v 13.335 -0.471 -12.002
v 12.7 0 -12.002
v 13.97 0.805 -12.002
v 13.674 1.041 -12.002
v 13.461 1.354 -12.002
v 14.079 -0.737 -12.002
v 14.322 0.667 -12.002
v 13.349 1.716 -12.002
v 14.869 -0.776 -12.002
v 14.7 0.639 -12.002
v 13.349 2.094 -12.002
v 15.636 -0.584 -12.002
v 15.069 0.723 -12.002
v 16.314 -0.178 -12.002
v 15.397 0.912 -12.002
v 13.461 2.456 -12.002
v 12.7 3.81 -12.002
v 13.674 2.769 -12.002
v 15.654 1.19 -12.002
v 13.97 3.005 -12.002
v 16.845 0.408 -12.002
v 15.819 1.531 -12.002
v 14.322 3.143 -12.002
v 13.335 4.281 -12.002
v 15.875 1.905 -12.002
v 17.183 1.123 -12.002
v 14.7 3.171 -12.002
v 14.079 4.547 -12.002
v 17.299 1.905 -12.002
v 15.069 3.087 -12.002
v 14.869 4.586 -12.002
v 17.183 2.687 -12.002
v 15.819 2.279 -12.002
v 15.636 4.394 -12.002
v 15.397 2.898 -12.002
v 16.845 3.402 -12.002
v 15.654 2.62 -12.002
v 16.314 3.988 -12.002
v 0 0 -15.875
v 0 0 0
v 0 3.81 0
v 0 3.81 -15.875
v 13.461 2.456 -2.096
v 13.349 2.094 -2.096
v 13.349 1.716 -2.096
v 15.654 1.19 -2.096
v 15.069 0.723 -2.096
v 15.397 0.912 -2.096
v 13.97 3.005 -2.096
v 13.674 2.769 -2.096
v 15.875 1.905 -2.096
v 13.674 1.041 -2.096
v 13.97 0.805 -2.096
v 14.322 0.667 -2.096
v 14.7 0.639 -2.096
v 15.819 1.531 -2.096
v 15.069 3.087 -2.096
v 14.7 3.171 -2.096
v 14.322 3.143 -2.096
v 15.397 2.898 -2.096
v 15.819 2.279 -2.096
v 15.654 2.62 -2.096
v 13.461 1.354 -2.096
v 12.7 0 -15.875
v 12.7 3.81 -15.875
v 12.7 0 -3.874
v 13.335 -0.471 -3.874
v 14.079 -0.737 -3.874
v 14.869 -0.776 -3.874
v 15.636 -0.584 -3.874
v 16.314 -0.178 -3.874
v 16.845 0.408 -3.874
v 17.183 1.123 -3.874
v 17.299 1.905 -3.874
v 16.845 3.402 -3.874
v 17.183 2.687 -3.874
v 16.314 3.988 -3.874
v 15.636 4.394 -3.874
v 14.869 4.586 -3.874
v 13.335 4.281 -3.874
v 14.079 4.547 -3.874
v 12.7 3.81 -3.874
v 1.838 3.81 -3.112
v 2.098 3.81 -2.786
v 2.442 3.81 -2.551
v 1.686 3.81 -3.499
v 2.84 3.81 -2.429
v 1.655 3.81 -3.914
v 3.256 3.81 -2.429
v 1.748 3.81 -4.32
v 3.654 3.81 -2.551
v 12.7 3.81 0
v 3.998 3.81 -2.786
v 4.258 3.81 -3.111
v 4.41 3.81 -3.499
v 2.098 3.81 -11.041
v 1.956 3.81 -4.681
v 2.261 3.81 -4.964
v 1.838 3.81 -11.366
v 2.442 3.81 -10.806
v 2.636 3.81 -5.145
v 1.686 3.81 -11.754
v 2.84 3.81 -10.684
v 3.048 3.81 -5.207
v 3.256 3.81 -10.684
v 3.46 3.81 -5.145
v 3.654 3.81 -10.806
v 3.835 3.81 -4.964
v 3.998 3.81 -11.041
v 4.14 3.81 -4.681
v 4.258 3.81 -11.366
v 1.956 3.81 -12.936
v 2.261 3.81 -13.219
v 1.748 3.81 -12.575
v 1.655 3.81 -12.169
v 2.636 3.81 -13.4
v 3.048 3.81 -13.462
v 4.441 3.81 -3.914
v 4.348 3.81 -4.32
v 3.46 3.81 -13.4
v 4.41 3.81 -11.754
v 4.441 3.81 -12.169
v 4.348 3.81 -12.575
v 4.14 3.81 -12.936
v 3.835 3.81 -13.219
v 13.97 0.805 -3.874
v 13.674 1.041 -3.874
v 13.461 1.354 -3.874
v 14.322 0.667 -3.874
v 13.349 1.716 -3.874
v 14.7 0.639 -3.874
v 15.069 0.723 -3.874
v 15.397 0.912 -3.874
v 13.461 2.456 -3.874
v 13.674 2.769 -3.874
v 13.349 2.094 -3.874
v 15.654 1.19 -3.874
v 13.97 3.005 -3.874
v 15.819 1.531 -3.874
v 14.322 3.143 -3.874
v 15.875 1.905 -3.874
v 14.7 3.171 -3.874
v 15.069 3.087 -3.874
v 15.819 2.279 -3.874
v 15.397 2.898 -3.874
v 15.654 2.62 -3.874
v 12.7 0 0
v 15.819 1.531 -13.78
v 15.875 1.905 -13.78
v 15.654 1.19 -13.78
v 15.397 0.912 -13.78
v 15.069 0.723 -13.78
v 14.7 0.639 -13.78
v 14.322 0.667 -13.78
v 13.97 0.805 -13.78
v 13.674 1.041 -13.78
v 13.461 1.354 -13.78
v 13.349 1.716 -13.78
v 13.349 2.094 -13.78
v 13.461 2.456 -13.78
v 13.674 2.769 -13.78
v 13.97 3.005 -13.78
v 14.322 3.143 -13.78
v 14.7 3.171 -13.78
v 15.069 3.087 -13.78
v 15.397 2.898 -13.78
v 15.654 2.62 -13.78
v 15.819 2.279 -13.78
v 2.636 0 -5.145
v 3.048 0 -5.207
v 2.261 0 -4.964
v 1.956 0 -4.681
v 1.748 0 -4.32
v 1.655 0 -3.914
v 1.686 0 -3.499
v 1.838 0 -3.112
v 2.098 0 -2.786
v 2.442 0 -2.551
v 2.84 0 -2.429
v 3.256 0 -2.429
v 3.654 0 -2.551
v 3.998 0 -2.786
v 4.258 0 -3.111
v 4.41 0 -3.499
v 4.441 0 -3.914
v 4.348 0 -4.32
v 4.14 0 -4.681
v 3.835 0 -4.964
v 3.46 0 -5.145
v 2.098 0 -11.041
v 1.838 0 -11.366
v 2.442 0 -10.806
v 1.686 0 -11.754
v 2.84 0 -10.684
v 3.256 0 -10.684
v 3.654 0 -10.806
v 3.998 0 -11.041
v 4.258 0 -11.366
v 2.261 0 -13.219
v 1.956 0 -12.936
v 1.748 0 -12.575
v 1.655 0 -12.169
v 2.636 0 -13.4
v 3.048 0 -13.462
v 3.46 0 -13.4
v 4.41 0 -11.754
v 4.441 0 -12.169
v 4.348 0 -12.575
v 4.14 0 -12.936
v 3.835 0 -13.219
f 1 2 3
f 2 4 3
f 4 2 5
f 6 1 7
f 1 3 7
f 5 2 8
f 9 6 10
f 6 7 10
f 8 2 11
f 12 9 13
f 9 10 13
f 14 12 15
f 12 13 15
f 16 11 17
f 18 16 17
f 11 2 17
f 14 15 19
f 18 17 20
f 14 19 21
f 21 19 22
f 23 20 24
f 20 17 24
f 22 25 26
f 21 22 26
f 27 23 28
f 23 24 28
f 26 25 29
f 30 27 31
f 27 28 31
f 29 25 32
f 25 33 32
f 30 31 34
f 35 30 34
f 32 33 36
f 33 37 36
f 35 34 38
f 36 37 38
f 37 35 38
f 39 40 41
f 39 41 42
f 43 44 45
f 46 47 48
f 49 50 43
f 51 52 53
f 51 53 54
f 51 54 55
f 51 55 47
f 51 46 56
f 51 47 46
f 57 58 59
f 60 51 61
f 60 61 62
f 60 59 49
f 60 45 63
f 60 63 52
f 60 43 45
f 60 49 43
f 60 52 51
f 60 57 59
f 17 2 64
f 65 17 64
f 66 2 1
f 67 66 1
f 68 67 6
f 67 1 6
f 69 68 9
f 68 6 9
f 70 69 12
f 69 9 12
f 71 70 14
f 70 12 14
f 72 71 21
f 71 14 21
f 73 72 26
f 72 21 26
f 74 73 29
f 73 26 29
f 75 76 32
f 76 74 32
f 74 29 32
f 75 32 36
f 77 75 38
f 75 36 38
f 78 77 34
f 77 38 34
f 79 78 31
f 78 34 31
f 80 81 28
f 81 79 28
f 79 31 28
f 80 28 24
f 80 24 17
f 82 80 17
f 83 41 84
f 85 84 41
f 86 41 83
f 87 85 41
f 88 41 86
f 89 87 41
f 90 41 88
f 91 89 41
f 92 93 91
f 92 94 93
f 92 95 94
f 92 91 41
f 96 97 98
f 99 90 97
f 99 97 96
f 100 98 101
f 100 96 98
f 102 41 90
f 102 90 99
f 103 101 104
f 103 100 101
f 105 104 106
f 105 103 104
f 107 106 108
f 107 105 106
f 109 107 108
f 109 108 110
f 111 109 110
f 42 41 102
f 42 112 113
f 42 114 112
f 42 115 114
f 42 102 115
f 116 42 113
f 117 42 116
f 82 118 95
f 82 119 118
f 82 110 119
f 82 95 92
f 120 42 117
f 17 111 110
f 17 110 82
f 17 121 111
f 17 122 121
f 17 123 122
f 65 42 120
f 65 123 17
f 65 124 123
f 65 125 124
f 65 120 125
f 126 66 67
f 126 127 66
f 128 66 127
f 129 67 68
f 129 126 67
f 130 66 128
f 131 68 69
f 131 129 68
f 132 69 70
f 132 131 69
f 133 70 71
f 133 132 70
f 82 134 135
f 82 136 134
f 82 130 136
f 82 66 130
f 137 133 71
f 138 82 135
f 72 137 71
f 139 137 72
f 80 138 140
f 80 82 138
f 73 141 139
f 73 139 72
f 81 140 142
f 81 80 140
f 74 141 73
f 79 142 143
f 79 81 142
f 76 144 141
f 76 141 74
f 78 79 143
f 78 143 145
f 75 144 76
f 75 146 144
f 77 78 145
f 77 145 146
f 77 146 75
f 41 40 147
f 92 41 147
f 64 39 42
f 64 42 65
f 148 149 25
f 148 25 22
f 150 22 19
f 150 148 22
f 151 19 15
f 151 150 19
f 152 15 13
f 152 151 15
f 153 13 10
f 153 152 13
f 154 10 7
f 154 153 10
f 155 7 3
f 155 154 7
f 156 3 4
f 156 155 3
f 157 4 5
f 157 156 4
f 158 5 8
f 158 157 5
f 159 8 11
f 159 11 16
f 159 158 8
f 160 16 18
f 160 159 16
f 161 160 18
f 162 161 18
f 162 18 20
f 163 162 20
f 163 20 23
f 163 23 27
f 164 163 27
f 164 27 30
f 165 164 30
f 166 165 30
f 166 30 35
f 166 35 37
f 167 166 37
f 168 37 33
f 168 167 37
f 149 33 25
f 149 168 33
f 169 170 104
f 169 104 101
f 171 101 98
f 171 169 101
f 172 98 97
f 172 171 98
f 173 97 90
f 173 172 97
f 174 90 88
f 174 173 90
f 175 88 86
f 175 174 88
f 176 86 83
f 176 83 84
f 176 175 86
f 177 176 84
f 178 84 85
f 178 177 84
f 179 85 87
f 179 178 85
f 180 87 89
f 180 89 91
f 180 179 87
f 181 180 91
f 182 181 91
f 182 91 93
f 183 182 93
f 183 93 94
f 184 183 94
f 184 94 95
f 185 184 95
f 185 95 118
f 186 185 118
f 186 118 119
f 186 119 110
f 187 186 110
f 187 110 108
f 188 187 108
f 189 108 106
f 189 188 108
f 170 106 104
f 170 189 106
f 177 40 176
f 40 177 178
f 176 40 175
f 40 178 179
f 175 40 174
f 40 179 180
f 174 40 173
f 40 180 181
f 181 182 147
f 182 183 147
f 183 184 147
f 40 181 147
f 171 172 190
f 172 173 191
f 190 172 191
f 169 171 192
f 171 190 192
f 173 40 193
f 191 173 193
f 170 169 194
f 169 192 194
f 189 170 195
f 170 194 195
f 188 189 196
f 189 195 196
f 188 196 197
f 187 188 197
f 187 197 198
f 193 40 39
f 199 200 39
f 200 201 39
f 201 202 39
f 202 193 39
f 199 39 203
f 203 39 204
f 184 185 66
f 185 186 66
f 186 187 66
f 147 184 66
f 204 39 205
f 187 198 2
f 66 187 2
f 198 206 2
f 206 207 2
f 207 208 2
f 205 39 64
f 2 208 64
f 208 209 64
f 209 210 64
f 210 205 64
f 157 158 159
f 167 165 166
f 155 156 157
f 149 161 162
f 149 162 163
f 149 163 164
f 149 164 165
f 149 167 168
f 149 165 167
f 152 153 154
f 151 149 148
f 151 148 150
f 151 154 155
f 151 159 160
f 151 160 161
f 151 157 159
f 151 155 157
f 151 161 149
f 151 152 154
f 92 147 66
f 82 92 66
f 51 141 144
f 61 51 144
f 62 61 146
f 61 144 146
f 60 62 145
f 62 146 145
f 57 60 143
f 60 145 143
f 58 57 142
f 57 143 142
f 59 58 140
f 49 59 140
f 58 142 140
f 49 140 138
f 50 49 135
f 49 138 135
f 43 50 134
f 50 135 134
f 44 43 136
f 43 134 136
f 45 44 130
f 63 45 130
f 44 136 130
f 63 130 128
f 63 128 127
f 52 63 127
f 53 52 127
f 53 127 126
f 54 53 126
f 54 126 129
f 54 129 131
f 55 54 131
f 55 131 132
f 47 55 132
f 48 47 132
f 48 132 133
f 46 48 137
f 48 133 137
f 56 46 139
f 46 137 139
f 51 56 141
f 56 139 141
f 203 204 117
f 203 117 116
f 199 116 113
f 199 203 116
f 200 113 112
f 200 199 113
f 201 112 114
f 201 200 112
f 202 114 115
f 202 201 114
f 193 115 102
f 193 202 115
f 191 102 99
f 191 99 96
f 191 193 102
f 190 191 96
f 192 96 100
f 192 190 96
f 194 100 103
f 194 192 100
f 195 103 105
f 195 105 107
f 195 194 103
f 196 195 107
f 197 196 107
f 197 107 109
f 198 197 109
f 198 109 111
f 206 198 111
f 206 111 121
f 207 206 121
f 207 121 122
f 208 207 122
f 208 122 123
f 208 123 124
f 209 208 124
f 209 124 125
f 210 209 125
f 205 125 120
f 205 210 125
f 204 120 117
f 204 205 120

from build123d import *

# Parameters (mm, degrees)
SKETCH3_W                = 12.7
SKETCH3_H                = 15.875
SKETCH3_R                = 1.397
BOSS_EXTRUDE1_DEPTH      = 3.81
BOSS_EXTRUDE2_DEPTH      = 4.064
BOSS_EXTRUDE2_DEPTH_BACK = 4.064
SKETCH5_R                = 2.694076836
SKETCH6_R                = 1.27
BOSS_EXTRUDE3_DEPTH      = 1.778
BOSS_EXTRUDE4_START      = 1.778
SKETCH7_R                = 1.27
BOSS_EXTRUDE4_DEPTH      = 1.778


with BuildPart() as part:
    # Sketch3 → Boss-Extrude1 (new body)
    with BuildSketch(Plane(origin=(0, 0, 0), x_dir=(1, 0, 0), z_dir=(0, 1, 0))):
        with Locations((6.35, 7.9375)):
            Rectangle(SKETCH3_W, SKETCH3_H)
        with Locations(Location((3.048, 3.81, 0), (0, 0, 90))):
            Circle(SKETCH3_R, mode=Mode.SUBTRACT)
        with Locations(Location((3.048, 12.065, 0), (0, 0, 90))):
            Circle(SKETCH3_R, mode=Mode.SUBTRACT)
    extrude(amount=BOSS_EXTRUDE1_DEPTH)

    # Sketch5 → Boss-Extrude2 (add, two sides: drawn at the far end of the back side and taken through both)
    with BuildSketch(Plane.XY.offset(-7.9375).offset(-BOSS_EXTRUDE2_DEPTH_BACK)):
        with Locations((14.605, 1.905)):
            Circle(SKETCH5_R)
    extrude(amount=BOSS_EXTRUDE2_DEPTH + BOSS_EXTRUDE2_DEPTH_BACK)

    # Sketch6 → Boss-Extrude3 (add)
    with BuildSketch(Plane.XY.offset(-3.8735)):
        with Locations((14.605, 1.905)):
            Circle(SKETCH6_R)
    extrude(amount=BOSS_EXTRUDE3_DEPTH)

    # Sketch7 → Boss-Extrude4 (add)
    with BuildSketch(Plane(origin=(0, 0, -12.0015), x_dir=(-1, 0, 0), z_dir=(0, 0, -1)).offset(BOSS_EXTRUDE4_START)):
        with Locations(Location((-14.605, 1.905, 0), (0, 0, 180))):
            Circle(SKETCH7_R)
    extrude(amount=-BOSS_EXTRUDE4_DEPTH)


solid = part.part
